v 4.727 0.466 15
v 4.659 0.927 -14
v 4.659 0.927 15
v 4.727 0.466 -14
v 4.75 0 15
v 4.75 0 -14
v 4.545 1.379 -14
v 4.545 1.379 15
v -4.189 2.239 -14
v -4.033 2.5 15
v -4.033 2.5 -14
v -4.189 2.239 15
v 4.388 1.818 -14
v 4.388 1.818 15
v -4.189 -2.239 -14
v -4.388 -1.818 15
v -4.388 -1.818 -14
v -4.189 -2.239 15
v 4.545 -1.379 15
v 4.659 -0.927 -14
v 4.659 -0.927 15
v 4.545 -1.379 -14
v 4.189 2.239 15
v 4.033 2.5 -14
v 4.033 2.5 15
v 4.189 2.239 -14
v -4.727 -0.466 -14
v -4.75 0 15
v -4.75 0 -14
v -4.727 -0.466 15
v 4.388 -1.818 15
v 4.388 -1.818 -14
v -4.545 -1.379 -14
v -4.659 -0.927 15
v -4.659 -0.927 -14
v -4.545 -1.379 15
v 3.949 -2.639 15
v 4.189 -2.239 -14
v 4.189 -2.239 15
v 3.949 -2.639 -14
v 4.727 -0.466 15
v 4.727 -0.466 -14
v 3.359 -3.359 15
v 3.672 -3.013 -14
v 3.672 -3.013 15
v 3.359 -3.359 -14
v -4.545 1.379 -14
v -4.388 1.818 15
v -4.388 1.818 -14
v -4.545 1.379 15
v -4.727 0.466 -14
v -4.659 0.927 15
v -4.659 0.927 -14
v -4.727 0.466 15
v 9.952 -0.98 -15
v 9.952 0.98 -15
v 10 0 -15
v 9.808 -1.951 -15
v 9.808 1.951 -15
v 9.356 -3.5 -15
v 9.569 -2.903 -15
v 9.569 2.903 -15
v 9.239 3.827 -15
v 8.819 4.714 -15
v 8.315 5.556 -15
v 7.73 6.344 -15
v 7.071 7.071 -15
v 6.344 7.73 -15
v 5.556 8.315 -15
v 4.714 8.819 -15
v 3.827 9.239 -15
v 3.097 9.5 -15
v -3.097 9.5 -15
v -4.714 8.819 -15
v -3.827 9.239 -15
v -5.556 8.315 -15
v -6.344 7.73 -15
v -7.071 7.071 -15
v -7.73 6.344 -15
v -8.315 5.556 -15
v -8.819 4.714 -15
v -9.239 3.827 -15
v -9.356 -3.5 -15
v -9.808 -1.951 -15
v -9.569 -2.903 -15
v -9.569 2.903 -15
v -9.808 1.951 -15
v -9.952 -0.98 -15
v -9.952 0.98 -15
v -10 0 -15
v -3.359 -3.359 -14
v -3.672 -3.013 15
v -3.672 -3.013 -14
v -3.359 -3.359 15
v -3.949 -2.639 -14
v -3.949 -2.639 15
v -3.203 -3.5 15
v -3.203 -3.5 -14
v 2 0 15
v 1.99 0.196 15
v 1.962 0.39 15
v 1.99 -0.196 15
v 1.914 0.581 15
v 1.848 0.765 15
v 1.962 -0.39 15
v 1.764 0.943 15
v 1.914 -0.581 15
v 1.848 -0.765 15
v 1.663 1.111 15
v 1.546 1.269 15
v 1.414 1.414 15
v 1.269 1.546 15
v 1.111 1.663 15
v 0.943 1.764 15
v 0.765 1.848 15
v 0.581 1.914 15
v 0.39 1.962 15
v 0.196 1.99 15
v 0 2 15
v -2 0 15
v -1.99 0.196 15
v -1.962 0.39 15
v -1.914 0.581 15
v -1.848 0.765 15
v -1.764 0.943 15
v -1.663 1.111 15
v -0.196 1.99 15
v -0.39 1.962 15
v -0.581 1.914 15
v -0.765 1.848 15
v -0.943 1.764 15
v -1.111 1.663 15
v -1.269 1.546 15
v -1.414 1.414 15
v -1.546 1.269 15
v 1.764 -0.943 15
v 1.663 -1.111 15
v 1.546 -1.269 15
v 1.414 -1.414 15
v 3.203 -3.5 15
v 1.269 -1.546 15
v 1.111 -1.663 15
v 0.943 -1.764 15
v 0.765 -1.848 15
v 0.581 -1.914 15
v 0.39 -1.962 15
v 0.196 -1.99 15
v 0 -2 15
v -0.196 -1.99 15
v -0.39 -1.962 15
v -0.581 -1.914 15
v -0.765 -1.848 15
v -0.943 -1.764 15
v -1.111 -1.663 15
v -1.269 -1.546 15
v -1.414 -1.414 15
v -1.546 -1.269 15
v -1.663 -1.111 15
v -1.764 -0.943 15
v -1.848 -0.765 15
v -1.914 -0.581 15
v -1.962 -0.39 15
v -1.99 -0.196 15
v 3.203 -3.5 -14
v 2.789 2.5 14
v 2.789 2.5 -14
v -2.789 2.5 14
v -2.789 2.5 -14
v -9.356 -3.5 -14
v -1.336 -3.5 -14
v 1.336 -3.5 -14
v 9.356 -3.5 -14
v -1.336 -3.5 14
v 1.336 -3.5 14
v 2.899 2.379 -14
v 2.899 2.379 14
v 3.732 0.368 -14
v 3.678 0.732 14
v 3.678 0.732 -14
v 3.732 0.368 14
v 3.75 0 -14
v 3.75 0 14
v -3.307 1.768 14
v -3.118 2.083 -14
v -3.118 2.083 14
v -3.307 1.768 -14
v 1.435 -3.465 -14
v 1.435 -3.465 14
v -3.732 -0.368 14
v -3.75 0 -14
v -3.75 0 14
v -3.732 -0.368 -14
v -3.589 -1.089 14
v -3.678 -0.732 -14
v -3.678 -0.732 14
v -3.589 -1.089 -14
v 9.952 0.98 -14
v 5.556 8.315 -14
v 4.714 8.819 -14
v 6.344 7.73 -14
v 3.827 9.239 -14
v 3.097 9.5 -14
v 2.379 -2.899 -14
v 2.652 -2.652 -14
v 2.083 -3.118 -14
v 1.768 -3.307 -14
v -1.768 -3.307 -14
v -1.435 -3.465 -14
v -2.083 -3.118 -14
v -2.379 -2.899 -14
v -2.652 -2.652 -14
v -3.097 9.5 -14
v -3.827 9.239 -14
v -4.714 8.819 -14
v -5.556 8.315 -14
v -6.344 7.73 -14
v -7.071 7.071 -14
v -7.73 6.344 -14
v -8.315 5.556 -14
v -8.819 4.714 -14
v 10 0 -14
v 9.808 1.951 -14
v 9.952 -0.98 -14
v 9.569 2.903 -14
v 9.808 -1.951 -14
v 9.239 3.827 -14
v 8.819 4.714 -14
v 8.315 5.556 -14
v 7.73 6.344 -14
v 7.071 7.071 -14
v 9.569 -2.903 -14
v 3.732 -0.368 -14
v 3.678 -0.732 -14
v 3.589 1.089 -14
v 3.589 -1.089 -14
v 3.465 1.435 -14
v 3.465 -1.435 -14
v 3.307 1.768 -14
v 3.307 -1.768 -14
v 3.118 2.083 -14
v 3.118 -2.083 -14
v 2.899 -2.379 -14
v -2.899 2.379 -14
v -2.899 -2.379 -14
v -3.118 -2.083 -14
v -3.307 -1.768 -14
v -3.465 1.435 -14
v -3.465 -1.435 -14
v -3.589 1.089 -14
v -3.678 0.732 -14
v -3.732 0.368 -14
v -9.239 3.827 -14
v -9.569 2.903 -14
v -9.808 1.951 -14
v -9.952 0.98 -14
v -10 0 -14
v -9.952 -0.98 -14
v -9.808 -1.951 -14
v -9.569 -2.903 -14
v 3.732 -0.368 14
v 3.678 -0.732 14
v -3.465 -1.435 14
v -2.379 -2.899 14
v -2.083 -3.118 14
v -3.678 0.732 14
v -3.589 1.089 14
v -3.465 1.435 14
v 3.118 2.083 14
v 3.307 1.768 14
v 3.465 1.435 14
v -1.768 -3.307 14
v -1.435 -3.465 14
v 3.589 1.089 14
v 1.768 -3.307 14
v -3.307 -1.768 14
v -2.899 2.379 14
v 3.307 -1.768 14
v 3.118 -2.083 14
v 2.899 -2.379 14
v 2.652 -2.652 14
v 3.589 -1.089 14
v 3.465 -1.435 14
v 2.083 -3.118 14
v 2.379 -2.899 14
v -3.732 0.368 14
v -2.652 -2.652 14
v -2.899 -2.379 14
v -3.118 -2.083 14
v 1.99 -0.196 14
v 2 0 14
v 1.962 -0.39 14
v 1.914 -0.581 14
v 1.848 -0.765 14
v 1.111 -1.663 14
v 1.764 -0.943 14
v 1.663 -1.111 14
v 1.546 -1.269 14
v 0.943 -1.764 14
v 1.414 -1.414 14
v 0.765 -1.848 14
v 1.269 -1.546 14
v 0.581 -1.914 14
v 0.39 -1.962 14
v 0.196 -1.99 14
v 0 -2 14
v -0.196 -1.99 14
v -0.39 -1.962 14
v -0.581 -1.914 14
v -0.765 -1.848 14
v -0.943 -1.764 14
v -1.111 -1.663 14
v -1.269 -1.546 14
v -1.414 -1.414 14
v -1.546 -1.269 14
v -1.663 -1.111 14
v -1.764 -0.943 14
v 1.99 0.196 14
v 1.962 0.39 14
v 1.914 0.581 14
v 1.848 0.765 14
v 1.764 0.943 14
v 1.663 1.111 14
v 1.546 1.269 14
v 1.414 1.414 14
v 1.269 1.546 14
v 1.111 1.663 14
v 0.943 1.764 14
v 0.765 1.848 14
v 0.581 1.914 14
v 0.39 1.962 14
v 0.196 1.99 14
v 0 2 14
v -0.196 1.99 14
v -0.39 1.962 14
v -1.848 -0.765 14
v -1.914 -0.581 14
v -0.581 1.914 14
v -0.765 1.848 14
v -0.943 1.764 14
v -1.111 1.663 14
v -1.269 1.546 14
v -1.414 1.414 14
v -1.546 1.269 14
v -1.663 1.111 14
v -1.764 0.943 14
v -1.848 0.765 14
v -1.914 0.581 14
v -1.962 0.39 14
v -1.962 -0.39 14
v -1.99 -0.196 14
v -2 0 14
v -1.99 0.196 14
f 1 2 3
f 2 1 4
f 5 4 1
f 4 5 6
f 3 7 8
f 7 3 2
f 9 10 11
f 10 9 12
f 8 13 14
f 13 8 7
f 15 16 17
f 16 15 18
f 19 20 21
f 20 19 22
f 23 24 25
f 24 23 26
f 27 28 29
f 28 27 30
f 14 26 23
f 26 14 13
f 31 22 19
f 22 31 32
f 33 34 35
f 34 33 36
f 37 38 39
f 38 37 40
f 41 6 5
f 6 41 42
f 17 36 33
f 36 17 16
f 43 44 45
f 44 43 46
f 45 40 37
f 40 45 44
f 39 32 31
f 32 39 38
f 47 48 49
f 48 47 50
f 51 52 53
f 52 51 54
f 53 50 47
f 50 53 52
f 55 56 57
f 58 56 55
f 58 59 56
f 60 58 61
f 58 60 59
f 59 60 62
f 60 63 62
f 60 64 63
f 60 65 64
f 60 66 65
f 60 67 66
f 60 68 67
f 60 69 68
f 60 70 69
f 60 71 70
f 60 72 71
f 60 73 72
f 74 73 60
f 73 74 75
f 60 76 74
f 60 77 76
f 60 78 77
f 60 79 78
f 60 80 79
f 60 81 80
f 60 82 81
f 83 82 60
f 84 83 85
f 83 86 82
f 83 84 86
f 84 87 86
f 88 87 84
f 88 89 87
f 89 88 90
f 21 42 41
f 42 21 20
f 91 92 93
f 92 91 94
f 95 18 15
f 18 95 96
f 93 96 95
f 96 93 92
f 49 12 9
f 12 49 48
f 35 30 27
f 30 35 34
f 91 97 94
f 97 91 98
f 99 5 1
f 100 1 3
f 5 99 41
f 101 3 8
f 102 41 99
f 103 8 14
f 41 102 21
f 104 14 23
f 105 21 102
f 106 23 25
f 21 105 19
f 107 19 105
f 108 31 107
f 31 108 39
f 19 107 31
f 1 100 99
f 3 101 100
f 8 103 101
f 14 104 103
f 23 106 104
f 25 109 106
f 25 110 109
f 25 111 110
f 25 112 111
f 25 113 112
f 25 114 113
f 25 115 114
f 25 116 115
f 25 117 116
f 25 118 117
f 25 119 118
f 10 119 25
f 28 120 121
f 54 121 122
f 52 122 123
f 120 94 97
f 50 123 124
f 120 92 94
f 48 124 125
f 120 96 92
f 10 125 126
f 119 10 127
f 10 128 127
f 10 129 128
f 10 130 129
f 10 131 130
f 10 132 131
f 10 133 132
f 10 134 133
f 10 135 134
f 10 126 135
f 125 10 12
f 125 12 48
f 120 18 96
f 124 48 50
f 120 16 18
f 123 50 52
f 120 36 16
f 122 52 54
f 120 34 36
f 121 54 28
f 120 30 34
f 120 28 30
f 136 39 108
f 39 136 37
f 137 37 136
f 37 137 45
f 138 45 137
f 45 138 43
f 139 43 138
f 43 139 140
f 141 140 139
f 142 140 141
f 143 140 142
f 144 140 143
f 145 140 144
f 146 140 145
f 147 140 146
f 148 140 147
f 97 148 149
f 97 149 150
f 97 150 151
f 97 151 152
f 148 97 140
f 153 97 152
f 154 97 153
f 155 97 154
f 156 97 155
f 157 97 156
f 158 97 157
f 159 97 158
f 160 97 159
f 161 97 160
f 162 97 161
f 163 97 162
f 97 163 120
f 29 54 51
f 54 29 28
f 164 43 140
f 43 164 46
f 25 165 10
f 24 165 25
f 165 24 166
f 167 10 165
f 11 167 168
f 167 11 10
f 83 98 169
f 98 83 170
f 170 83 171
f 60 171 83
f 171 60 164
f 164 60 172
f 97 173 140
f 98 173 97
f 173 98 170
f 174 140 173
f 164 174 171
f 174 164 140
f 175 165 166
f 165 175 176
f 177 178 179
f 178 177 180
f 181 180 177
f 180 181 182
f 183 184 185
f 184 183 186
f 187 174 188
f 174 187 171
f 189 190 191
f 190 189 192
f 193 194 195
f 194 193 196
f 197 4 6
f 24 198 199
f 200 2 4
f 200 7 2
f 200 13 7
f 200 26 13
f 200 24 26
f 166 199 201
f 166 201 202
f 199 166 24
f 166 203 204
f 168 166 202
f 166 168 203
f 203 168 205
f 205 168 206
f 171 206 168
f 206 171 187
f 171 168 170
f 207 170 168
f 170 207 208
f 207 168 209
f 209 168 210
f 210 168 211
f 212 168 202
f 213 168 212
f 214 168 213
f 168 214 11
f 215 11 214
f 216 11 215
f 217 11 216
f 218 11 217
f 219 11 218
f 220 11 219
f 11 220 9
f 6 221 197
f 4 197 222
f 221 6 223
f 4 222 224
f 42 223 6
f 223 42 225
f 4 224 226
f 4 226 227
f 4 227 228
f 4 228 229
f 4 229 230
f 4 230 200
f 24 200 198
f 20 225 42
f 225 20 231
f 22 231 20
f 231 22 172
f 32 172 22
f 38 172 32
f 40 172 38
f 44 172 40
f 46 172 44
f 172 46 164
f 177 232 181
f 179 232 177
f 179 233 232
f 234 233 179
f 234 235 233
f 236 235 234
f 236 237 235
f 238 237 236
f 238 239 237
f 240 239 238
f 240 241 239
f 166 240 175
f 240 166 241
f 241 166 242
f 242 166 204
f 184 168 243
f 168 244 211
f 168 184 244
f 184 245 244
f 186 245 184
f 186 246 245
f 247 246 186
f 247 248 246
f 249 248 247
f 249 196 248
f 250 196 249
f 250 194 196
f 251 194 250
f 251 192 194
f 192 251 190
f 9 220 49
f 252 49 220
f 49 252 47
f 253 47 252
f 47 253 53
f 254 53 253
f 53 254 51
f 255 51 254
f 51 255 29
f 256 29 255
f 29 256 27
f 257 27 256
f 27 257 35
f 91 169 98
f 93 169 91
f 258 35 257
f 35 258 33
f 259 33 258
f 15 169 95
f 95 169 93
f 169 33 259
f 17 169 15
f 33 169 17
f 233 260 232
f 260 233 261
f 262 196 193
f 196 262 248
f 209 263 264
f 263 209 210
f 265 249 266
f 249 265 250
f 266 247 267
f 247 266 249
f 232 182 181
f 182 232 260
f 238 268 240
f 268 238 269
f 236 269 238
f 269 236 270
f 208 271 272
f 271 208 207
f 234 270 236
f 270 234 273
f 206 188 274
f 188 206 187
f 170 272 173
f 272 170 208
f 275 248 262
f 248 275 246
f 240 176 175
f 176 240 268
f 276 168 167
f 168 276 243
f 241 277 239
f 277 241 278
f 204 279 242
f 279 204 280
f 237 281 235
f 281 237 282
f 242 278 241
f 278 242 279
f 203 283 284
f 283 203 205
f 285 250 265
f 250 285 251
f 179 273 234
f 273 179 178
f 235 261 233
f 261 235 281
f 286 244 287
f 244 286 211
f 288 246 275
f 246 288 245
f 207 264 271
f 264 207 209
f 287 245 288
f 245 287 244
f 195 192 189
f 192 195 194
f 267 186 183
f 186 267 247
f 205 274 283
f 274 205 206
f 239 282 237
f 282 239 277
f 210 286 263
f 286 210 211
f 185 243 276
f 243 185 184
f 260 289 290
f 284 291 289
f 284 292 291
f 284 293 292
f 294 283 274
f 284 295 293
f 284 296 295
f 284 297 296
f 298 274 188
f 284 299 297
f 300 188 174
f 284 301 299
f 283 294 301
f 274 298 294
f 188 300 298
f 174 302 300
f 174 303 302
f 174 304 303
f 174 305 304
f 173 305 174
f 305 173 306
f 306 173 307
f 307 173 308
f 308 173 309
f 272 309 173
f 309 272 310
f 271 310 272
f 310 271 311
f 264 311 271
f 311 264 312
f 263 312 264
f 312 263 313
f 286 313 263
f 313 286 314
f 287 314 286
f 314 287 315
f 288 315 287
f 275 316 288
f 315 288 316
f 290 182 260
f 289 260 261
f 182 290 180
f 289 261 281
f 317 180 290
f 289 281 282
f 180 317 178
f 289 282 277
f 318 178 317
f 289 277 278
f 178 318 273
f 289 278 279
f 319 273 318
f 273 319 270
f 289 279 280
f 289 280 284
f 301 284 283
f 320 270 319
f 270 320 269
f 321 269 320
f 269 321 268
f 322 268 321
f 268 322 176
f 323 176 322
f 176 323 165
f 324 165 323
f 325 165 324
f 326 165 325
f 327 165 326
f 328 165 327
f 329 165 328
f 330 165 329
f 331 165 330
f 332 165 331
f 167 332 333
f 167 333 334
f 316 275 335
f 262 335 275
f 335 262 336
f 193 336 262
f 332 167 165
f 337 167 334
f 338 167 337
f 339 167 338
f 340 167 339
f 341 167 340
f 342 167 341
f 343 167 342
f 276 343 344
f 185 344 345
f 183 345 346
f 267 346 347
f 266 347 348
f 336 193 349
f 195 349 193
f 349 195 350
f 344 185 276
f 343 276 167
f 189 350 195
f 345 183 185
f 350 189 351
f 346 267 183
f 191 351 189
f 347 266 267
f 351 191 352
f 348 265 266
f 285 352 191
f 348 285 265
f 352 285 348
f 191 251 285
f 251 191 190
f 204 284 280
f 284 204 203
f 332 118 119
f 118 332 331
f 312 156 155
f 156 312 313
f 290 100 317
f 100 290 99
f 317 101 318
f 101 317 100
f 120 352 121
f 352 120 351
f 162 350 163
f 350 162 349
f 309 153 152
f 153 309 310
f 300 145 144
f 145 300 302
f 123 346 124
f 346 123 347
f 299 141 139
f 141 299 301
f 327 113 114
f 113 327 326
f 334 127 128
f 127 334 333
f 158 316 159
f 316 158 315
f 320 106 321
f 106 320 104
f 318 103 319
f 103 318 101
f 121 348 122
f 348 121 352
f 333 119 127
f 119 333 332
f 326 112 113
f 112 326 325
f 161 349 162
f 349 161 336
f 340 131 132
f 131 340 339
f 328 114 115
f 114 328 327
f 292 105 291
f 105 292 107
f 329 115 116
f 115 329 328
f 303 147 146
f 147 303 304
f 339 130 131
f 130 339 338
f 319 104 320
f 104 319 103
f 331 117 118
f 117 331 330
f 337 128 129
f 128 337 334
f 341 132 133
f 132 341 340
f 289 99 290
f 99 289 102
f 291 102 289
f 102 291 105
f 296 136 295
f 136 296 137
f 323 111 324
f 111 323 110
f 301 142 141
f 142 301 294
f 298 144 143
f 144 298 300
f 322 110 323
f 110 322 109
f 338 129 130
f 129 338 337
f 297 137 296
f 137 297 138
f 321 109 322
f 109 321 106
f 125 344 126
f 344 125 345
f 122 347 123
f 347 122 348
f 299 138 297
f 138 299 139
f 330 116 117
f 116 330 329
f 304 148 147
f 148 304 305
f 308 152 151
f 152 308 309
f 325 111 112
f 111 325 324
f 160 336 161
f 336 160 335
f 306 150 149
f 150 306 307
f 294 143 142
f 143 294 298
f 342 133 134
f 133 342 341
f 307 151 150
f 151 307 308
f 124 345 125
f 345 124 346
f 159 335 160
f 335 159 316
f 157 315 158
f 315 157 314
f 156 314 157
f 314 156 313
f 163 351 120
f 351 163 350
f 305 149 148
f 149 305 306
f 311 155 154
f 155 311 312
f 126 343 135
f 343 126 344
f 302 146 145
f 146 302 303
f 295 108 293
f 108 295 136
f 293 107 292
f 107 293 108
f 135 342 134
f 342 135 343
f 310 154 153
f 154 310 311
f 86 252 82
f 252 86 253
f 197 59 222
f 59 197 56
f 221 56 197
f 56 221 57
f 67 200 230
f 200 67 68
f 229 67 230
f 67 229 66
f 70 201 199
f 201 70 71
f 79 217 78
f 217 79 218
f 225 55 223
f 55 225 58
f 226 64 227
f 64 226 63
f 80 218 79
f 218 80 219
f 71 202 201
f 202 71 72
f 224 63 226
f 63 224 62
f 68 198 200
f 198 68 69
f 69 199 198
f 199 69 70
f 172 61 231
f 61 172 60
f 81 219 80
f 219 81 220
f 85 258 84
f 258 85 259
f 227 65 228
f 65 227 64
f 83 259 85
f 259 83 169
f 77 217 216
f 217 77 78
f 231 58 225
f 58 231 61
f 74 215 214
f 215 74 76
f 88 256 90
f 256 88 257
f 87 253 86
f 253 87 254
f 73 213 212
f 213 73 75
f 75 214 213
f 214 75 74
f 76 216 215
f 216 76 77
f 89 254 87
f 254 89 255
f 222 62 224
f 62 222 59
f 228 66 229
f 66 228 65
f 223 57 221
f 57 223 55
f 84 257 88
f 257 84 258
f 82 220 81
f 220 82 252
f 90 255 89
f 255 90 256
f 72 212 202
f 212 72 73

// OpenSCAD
// file: parameters.scad
$fn = 64;

clearance = 0.4;

spar_radius = 6/2;
subspar_radius = 2.8/2;

fuselage_width = 75;

motor_diameter = 7;
motor_length = 16;

led_diameter = 4.75;

rib_width = 4;
nacelle_width = rib_width+2;

wing_length = 280;
wing_chord = 90;

wing_start = fuselage_width/2;
wing_end = wing_start + wing_length;
wingspan = 2*wing_end;
// main file
include <./parameters.scad>

module stand(diameter, length, width, thickness, shaft, base, offset){
    r = diameter/2;
    union(){
        difference(){
            intersection(){
                cylinder(length+thickness*2,r+thickness,r+thickness,true);
                translate([0,-offset,0]){
                    cube([100,width,length*2],true);
                } 
            }
            cylinder(length,r,r,true);
            translate([0,0,(length+thickness)*0.5]){
                cylinder(thickness*2,shaft/2,shaft/2,true);
            }
        }
        translate([0,0,-(length+thickness)/2]){
            intersection(){
                cylinder(thickness, base, base, true);
                translate([0,base/2-width/4-offset,0]){
                    cube([100,base+width/2,base],true);
                } 
            }
        } 
    }
}

stand(motor_diameter+0.5,motor_length*1.75,6,1,4,10,0.5);
